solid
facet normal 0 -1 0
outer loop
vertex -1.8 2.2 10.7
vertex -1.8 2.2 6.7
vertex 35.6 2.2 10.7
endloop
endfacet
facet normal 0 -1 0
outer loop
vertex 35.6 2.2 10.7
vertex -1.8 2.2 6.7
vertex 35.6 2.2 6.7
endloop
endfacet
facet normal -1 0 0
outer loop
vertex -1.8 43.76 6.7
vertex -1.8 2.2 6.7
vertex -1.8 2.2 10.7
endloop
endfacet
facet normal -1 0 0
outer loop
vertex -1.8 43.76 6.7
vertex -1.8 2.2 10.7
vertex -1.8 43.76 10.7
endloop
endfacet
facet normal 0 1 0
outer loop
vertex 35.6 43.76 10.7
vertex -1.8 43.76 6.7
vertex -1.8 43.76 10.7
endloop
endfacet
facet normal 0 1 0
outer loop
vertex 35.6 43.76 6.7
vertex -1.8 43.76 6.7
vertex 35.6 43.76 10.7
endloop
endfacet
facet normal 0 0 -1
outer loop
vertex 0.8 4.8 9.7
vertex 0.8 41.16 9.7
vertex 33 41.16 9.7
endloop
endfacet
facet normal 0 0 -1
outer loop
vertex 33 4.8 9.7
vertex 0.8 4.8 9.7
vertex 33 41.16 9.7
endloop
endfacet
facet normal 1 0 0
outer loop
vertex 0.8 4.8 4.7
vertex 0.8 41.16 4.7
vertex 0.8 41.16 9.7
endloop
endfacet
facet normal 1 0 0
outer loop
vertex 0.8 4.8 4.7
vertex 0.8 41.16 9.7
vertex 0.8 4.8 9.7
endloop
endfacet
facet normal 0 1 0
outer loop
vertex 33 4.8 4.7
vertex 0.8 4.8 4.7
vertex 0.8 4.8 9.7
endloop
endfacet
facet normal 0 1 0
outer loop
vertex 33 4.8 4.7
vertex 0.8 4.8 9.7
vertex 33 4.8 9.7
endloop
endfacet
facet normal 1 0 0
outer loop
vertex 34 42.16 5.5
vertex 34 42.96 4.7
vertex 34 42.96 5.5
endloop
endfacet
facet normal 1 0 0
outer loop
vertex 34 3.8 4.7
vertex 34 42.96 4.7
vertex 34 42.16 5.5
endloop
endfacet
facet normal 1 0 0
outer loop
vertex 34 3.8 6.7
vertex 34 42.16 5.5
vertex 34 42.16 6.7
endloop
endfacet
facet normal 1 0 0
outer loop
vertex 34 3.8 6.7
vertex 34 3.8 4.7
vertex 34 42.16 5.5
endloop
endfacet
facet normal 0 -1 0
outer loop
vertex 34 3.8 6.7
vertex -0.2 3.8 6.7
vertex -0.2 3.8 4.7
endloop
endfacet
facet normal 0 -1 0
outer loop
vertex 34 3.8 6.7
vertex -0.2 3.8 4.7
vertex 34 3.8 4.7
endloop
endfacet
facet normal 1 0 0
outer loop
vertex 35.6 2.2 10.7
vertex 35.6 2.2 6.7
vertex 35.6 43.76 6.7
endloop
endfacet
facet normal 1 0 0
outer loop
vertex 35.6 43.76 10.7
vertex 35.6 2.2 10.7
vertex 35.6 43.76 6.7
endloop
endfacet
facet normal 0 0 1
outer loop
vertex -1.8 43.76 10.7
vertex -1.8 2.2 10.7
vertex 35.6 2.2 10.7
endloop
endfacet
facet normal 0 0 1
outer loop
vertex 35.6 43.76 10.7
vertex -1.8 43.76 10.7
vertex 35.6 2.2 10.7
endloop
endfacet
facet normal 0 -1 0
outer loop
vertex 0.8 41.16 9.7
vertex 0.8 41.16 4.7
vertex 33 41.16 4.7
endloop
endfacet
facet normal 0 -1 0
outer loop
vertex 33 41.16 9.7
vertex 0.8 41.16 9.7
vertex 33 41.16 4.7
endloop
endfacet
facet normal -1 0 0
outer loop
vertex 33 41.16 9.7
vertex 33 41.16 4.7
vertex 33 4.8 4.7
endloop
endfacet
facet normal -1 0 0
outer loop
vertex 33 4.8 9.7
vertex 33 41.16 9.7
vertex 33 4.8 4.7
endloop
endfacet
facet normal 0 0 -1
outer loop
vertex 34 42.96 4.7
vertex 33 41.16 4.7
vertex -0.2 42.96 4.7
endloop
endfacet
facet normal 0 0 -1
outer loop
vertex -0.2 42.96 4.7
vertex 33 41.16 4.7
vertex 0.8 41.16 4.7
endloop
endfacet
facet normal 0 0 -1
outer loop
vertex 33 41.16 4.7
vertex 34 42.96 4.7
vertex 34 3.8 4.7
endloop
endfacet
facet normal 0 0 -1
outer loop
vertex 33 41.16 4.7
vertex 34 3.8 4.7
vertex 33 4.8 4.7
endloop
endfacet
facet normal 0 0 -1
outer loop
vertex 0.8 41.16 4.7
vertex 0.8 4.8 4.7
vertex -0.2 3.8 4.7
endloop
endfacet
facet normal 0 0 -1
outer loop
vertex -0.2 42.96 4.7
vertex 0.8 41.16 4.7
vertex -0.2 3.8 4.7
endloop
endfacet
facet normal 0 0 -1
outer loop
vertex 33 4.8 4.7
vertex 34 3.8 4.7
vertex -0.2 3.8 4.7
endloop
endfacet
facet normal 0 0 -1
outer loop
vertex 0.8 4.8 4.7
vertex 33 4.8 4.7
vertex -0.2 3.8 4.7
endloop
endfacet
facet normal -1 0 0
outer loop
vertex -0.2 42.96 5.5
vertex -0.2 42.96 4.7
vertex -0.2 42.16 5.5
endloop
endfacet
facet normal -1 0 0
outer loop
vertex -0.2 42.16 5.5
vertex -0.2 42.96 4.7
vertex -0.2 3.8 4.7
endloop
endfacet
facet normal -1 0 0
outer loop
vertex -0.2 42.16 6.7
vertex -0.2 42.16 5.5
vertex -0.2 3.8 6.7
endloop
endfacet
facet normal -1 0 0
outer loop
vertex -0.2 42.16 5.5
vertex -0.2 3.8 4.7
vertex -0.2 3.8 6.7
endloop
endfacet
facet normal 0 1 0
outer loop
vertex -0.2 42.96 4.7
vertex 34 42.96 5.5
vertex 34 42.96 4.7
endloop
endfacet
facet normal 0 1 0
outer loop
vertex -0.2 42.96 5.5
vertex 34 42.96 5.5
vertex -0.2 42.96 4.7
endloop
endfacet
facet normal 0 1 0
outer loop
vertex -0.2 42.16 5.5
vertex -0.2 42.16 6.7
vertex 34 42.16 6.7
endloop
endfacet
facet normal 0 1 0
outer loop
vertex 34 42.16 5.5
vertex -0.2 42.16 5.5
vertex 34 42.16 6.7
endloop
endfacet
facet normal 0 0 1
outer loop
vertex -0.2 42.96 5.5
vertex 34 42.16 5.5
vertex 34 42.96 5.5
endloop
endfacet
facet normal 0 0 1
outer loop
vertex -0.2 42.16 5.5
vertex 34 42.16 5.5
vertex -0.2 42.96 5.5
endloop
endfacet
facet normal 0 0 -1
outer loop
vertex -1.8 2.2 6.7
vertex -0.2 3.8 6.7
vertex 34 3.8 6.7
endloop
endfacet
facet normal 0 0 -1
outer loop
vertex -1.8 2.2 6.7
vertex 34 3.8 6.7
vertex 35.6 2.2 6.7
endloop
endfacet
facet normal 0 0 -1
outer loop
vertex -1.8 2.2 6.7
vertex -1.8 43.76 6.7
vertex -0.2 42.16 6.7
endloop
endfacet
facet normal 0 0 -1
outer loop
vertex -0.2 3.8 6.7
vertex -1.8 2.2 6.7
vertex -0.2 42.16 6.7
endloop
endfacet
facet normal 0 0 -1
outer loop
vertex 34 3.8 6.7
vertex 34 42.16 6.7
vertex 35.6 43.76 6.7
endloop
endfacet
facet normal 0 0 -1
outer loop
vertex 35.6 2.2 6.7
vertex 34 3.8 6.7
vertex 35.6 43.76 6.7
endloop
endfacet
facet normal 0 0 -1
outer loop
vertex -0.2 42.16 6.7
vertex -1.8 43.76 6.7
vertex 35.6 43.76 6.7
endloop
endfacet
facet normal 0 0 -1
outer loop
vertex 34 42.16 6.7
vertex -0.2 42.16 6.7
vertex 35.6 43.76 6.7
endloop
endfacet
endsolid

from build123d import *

# Parameters (mm, degrees)
SKETCH043_W     = 37.4
SKETCH043_H     = 41.56
PAD028_DEPTH    = 4
SKETCH044_W     = 34.2
SKETCH044_H     = 38.36
PAD029_DEPTH    = 2
SKETCH045_W     = 32.2
SKETCH045_H     = 36.36
POCKET024_DEPTH = 5
SKETCH046_W     = 34.2
SKETCH046_H     = 0.8
PAD030_DEPTH    = 0.8


with BuildPart() as part:
    # Sketch043 (on DatumPlane) → Pad028 (new body)
    with BuildSketch(Plane.XY.offset(6.7)):
        with Locations((16.9, 22.98)):
            Rectangle(SKETCH043_W, SKETCH043_H)
    extrude(amount=PAD028_DEPTH)

    # Sketch044 (on Face5 of Pad028) → Pad029 (join)
    with BuildSketch(Plane(origin=(0, 0, 6.7), x_dir=(1, 0, 0), z_dir=(0, 0, -1))):
        with Locations((16.9, -22.98)):
            Rectangle(SKETCH044_W, SKETCH044_H)
    extrude(amount=PAD029_DEPTH)

    # Sketch045 (on Face11 of Pad029) → Pocket024 (cut)
    with BuildSketch(Plane(origin=(0, 0, 4.7), x_dir=(1, 0, 0), z_dir=(0, 0, -1))):
        with Locations((16.9, -22.98)):
            Rectangle(SKETCH045_W, SKETCH045_H)
    extrude(amount=-POCKET024_DEPTH, mode=Mode.SUBTRACT)

    # Sketch046 (on Face9 of Pocket024) → Pad030 (join)
    with BuildSketch(Plane(origin=(0, 42.16, 6.7), x_dir=(-1, 0, 0), z_dir=(0, 1, 0))):
        with Locations((-16.9, -1.6)):
            Rectangle(SKETCH046_W, SKETCH046_H)
    extrude(amount=PAD030_DEPTH)


solid = part.part
